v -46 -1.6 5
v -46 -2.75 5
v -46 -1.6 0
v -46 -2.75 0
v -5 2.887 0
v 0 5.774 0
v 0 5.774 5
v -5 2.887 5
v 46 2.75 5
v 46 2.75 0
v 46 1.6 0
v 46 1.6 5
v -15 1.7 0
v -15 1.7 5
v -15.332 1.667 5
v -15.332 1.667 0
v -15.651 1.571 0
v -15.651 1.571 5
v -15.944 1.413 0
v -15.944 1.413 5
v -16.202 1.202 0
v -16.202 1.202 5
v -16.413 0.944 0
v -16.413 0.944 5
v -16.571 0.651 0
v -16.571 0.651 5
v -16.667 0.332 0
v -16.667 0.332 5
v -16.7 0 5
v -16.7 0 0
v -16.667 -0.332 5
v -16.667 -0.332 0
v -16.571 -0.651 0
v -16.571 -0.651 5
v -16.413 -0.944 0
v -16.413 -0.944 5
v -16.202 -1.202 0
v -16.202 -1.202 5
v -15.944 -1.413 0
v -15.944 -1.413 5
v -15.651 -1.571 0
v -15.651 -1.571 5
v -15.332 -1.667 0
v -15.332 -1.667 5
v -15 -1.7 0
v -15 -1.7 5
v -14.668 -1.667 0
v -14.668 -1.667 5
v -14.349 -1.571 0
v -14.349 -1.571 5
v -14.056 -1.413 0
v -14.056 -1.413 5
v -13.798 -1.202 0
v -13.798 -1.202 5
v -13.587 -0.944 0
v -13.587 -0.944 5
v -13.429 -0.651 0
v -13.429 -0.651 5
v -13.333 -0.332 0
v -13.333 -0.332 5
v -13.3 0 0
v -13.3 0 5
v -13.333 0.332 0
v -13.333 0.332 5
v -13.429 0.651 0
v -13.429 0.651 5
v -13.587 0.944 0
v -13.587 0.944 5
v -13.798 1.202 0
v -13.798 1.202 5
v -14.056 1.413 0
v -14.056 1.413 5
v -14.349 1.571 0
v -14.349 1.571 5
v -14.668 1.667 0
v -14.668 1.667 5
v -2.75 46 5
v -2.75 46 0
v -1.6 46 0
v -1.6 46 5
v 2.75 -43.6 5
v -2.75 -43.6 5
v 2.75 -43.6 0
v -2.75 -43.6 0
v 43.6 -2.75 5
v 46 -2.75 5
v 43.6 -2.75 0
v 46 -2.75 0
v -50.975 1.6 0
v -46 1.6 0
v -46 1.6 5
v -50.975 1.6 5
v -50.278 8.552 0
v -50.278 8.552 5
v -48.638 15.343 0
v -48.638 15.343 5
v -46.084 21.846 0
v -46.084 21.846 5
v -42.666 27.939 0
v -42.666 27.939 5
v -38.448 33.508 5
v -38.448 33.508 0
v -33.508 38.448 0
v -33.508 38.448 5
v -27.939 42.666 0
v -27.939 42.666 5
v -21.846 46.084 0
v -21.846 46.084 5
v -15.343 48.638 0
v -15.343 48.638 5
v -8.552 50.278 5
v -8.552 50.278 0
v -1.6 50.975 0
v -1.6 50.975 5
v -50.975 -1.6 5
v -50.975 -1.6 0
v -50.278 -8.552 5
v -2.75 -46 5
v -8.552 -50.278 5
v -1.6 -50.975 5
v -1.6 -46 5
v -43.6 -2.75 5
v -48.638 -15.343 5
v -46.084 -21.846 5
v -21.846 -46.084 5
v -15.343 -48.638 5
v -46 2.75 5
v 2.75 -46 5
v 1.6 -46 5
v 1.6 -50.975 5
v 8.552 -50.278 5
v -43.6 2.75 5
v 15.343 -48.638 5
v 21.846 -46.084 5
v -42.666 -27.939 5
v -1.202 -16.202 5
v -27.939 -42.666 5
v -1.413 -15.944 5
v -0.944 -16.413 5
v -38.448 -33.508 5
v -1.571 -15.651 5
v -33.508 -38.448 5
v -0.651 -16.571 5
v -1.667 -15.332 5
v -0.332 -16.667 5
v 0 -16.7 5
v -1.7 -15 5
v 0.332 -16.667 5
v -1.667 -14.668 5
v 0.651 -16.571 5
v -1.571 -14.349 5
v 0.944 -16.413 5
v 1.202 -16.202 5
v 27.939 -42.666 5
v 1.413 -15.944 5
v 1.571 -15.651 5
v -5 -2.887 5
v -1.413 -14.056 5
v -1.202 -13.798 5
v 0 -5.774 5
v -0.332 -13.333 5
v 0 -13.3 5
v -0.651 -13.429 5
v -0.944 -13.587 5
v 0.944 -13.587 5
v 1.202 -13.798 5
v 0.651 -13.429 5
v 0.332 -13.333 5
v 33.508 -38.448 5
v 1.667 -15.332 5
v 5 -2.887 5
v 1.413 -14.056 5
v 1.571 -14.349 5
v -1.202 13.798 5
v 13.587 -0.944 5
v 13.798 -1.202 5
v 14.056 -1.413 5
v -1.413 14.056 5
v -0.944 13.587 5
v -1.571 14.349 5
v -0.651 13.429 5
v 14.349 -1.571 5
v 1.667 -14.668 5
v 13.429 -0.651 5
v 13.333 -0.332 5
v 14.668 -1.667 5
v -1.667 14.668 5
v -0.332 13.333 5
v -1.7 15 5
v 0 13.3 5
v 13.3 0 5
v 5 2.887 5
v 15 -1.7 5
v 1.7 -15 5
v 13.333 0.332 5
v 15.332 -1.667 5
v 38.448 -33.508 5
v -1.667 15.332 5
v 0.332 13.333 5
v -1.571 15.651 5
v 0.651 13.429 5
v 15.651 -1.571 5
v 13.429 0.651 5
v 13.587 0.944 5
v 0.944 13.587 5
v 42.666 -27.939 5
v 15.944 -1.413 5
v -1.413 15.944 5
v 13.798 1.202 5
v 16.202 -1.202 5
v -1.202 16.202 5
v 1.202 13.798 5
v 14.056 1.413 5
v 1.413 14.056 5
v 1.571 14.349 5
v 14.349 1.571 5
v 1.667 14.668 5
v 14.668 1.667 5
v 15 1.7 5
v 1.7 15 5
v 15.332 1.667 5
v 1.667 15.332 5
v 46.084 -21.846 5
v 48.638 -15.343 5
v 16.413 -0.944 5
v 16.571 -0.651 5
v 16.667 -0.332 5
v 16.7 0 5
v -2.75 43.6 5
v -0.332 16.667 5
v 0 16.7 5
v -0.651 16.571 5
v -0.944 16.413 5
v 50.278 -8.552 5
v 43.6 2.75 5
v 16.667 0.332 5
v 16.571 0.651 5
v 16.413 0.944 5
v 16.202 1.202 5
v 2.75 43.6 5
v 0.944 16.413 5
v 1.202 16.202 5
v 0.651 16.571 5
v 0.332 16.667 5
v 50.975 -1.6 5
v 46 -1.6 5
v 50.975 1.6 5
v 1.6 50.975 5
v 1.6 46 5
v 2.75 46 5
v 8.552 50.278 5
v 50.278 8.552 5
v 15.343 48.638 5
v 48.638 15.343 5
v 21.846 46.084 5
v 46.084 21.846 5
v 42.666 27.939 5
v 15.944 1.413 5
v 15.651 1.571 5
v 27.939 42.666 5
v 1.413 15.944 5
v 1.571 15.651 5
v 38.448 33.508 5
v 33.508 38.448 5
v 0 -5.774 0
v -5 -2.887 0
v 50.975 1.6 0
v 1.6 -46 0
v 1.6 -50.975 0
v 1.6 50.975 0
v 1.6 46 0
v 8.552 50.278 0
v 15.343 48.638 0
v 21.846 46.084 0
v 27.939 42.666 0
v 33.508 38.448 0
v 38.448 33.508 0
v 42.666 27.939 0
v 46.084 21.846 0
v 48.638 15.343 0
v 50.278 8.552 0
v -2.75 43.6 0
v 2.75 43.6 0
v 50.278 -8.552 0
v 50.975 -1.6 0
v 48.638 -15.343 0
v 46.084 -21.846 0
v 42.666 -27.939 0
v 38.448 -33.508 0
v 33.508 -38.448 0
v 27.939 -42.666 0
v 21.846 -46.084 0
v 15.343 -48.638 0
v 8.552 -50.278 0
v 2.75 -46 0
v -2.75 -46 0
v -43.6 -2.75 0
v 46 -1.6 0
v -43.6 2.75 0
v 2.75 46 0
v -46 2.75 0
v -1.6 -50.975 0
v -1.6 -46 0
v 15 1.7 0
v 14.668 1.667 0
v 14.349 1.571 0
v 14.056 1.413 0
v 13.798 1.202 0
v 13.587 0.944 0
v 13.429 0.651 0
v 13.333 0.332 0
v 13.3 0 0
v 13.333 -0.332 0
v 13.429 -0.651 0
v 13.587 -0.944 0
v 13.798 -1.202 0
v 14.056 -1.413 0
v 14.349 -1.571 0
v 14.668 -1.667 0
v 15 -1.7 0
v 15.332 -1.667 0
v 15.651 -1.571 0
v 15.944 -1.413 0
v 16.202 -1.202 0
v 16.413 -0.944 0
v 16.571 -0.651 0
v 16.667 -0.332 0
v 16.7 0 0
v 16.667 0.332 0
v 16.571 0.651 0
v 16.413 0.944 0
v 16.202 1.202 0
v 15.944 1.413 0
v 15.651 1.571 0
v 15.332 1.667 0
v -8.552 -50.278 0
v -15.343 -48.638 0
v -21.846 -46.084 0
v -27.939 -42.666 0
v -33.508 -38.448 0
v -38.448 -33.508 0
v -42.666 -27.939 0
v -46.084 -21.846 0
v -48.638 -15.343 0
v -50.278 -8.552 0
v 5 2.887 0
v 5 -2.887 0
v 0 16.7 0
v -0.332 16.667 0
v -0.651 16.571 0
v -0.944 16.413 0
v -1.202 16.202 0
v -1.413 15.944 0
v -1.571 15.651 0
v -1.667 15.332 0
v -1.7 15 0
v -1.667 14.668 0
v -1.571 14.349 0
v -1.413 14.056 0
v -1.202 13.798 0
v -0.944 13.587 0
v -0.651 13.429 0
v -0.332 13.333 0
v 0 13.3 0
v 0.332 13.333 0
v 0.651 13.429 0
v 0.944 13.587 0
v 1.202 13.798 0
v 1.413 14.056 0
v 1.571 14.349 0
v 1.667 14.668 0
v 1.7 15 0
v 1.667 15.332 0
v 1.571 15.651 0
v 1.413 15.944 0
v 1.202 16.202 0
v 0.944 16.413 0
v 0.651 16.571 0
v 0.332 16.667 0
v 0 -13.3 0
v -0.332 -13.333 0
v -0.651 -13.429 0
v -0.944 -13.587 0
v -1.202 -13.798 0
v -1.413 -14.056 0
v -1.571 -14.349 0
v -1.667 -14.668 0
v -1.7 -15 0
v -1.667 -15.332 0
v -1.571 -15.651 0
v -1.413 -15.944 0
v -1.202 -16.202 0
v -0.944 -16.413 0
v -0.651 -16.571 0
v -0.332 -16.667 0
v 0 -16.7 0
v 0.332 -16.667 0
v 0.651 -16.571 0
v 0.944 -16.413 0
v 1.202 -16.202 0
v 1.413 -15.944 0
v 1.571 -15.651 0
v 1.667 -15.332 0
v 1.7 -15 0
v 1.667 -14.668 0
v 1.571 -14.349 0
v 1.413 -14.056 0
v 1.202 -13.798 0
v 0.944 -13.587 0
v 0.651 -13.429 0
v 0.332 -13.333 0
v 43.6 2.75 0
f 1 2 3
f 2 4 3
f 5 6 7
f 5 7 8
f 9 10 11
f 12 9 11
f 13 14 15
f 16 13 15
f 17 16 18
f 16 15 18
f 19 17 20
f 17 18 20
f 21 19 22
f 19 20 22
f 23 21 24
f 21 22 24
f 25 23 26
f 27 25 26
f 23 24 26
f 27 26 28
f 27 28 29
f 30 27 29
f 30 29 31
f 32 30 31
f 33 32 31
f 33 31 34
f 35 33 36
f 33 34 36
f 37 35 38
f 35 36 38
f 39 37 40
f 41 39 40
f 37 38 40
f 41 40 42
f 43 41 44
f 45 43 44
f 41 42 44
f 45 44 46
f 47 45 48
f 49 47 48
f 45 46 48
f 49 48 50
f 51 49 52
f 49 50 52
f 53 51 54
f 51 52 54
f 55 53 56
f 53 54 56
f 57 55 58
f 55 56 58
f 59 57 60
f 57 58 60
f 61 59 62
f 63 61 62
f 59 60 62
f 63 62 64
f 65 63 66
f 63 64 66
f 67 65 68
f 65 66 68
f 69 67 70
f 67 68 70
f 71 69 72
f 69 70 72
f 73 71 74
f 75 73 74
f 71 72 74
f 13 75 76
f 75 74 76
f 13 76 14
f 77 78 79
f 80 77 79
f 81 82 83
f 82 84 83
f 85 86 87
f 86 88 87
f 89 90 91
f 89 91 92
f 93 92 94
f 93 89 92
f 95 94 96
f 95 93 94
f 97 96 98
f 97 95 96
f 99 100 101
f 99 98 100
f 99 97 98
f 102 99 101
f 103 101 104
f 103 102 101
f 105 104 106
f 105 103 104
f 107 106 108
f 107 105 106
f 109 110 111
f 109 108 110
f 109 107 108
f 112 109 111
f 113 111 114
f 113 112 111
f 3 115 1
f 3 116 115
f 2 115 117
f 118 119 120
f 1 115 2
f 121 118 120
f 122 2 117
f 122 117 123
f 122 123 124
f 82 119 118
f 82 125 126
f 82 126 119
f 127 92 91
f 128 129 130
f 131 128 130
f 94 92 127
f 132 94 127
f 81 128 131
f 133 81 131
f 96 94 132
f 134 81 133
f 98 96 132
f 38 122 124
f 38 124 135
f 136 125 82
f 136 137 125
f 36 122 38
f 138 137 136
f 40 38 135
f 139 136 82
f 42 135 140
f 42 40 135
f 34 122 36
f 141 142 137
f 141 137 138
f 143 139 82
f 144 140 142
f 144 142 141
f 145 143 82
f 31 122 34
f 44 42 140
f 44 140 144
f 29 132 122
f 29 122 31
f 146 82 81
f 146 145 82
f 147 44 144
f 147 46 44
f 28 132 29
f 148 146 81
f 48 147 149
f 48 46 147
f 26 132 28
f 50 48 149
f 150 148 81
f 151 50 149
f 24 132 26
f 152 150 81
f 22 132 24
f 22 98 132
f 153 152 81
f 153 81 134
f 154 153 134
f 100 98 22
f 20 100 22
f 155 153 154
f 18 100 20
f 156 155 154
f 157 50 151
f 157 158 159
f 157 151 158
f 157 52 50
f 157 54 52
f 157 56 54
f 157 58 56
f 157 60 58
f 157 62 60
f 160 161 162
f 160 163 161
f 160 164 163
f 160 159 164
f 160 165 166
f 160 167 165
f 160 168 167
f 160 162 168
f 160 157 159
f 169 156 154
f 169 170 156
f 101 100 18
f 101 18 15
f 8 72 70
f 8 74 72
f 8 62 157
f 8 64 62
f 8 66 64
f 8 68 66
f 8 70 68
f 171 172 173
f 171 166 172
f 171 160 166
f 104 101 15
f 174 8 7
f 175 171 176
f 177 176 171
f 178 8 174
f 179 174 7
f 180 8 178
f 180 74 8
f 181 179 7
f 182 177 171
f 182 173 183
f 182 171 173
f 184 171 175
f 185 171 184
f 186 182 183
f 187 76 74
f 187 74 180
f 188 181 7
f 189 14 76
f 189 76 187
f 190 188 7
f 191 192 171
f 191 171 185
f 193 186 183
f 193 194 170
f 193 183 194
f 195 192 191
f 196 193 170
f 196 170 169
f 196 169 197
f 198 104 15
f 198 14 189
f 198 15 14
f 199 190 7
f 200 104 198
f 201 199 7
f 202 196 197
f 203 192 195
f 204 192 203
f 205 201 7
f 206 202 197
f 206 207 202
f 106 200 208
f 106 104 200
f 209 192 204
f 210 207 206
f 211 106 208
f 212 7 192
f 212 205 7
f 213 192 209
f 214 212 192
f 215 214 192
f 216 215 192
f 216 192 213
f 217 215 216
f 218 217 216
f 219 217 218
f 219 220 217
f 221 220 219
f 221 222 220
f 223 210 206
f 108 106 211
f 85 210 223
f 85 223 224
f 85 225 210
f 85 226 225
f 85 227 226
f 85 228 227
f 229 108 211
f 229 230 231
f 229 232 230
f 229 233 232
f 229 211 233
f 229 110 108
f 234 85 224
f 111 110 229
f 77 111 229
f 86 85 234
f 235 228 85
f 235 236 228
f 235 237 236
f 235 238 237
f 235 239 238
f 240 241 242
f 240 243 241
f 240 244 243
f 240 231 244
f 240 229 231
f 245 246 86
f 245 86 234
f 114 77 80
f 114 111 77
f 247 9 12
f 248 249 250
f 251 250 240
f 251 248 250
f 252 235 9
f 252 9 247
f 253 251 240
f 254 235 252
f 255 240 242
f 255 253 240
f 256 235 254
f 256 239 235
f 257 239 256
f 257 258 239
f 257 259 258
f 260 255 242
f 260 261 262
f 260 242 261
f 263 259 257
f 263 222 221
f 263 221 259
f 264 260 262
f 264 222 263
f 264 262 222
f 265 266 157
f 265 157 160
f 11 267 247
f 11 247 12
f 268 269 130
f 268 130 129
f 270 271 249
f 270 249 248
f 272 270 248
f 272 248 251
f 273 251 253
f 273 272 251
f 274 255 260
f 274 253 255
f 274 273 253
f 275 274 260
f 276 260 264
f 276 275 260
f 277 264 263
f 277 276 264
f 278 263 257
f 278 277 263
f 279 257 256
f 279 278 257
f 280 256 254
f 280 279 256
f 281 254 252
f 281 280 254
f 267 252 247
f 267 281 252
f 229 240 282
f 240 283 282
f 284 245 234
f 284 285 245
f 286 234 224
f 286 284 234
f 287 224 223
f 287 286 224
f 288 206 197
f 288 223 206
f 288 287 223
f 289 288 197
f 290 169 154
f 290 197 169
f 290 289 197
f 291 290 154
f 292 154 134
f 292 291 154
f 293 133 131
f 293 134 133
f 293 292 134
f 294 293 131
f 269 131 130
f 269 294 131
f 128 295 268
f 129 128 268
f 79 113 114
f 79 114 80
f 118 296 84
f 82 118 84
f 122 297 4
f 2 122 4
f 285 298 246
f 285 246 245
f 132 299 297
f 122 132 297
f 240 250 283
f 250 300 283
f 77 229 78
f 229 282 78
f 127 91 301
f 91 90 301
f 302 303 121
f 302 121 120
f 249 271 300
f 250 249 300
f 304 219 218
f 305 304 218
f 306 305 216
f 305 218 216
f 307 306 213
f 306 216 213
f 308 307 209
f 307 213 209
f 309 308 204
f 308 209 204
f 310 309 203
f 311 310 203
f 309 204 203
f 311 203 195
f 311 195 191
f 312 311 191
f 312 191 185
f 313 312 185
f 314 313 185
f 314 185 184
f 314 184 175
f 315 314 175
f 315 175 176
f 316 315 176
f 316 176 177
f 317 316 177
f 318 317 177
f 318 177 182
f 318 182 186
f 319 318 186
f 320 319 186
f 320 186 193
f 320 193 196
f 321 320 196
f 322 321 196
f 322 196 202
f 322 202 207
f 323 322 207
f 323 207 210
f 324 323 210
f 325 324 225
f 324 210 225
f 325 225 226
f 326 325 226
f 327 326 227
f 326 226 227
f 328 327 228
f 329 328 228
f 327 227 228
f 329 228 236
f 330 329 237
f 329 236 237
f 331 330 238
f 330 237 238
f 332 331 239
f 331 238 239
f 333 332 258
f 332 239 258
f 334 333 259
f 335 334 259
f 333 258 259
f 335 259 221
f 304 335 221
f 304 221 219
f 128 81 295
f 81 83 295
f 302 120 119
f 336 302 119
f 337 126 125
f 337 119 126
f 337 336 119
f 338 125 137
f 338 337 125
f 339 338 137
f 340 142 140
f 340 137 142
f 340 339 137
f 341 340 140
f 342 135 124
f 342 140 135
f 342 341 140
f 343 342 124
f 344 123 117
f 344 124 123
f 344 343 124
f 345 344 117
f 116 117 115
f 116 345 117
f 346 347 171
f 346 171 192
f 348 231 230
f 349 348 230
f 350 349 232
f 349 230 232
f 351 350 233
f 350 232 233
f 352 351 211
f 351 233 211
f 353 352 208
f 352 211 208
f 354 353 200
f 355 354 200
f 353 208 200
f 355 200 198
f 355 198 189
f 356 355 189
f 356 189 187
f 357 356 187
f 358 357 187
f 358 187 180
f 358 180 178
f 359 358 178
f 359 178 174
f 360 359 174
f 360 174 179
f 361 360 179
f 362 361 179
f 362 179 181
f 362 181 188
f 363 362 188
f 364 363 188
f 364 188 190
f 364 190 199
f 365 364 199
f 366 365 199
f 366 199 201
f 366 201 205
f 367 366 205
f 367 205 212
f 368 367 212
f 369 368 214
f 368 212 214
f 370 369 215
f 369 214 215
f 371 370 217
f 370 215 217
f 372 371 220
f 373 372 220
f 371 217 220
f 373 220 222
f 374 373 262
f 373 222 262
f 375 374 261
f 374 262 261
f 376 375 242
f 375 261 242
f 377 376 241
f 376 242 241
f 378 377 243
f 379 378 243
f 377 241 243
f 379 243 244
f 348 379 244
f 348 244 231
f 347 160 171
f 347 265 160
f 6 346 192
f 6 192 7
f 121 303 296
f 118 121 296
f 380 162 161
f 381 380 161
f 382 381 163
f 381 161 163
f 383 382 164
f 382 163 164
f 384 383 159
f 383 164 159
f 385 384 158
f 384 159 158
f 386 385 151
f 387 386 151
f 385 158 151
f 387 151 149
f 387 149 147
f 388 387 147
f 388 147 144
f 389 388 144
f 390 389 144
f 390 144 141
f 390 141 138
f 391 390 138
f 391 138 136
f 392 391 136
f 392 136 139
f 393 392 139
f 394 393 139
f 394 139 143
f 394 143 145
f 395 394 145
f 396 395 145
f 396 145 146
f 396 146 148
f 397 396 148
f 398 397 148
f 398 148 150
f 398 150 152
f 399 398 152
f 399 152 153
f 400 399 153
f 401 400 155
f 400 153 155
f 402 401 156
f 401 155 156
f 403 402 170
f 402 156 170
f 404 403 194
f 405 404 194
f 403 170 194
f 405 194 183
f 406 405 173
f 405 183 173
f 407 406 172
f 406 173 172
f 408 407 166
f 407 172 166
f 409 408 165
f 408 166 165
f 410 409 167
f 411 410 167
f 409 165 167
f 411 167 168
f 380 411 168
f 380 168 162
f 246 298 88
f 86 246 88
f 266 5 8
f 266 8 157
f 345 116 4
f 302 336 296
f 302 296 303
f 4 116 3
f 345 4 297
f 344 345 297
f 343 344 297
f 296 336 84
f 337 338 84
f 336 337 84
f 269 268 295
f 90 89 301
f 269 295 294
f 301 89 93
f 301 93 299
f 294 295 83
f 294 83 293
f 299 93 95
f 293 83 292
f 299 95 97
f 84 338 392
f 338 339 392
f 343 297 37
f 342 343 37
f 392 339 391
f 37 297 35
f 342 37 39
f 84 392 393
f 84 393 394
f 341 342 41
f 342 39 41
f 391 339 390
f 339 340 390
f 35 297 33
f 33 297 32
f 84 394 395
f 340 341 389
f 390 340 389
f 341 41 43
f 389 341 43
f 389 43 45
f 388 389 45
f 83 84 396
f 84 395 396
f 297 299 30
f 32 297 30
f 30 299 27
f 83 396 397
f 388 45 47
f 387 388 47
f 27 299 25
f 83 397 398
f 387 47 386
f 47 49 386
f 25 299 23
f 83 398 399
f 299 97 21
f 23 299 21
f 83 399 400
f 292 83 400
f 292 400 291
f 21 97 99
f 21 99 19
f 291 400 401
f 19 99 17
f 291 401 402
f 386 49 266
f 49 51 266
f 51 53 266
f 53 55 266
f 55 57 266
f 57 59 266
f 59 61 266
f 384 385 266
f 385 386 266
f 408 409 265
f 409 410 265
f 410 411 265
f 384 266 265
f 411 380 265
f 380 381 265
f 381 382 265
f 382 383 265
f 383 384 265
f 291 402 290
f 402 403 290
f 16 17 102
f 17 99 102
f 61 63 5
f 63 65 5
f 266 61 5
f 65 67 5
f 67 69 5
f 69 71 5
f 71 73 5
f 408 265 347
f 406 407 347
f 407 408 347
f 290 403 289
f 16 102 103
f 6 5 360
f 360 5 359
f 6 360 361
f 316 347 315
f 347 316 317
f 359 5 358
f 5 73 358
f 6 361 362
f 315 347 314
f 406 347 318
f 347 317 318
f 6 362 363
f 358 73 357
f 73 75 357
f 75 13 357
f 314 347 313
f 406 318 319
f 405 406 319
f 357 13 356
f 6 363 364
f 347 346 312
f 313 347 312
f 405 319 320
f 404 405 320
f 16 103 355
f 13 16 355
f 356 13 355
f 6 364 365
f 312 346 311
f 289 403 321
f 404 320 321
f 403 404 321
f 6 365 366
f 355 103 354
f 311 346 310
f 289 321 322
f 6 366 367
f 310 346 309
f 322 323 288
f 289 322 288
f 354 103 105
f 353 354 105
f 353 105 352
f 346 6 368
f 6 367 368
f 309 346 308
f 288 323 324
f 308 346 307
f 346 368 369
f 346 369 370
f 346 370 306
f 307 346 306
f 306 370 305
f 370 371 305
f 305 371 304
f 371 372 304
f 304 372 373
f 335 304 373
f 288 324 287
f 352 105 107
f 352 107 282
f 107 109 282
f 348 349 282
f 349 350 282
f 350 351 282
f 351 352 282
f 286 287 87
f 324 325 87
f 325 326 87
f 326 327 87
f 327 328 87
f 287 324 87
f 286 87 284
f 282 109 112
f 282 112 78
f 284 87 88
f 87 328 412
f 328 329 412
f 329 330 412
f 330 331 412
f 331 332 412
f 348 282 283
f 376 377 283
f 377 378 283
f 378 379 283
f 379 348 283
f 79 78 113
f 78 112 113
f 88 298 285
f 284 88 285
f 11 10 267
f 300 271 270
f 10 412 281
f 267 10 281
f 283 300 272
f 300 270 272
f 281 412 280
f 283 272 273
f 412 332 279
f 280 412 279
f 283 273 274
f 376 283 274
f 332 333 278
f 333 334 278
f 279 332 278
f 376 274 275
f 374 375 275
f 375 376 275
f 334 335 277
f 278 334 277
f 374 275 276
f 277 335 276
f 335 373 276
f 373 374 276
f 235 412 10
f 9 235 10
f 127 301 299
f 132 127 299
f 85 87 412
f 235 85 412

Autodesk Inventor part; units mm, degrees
ref_plane "YZ Plane" through (0, 0, 0) normal (1, 0, 0) x (0, 1, 0)
ref_plane "XZ Plane" through (0, 0, 0) normal (0, 1, 0) x (-1, 0, 0)
ref_plane "XY Plane" through (0, 0, 0) normal (0, 0, 1) x (1, 0, 0)
sketch "Sketch1" plane through (0, 0, 0) normal (0, 0, 1) x (1, 0, 0)
  circle A0 centre (0, 0) radius 51
  dimension "d0" = 102
extrude "Extrusion1" add sketch "Sketch1" along normal blind 5
sketch "Sketch2" plane through (0, 0, 0) normal (0, 0, -1) x (-1, 0, 0)
  line L0 (0, 5.7735) -> (5, 2.8868)
  line L1 (5, 2.8868) -> (5, -2.8868)
  line L2 (5, -2.8868) -> (0, -5.7735)
  line L3 (0, -5.7735) -> (-5, -2.8868)
  line L4 (-5, -2.8868) -> (-5, 2.8868)
  line L5 (-5, 2.8868) -> (0, 5.7735)
  point P0 (0, 0)
  point P1 (0, 0)
  dimension "d3" = 10
extrude "Extrusion2" cut sketch "Sketch2" against normal blind 5
sketch "Sketch3" plane through (0, 0, 0) normal (0, 0, -1) x (-1, 0, 0)
  circle A0 centre (0, 0) radius 15 construction
  point P0 (0, 15)
  point P1 (15, 0)
  point P2 (0, -15)
  point P3 (-15, 0)
  dimension "d6" = 30
hole "Hole1" at (0, 15, 0) at (-15, 0, 0) at (0, -15, 0) at (15, 0, 0) direction (0, 0, 1) diameter 3.4 depth 8 tip angle 118 clearance for "Countersunk Flat Head Screw DIN EN ISO 2009" size "M3" standard "DIN"
sketch "Sketch4" plane through (0, 0, 0) normal (0, 0, -1) x (-1, 0, 0)
  line L0 (-1.6, 51) -> (1.6, 51)
  line L1 (1.6, 51) -> (1.6, 46)
  line L2 (1.6, 46) -> (-2.75, 46)
  line L3 (-2.75, 46) -> (-2.75, 43.6)
  line L4 (-2.75, 43.6) -> (2.75, 43.6)
  line L5 (2.75, 43.6) -> (2.75, 46)
  line L6 (2.75, 46) -> (-1.6, 46)
  line L7 (-1.6, 46) -> (-1.6, 51)
  line L8 (-51, -1.6) -> (-51, 1.6)
  line L9 (-51, 1.6) -> (-46, 1.6)
  line L10 (-46, 1.6) -> (-46, -2.75)
  line L11 (-46, -2.75) -> (-43.6, -2.75)
  line L12 (-43.6, -2.75) -> (-43.6, 2.75)
  line L13 (-43.6, 2.75) -> (-46, 2.75)
  line L14 (-46, 2.75) -> (-46, -1.6)
  line L15 (-46, -1.6) -> (-51, -1.6)
  line L16 (1.6, -51) -> (-1.6, -51)
  line L17 (-1.6, -51) -> (-1.6, -46)
  line L18 (-1.6, -46) -> (2.75, -46)
  line L19 (2.75, -46) -> (2.75, -43.6)
  line L20 (2.75, -43.6) -> (-2.75, -43.6)
  line L21 (-2.75, -43.6) -> (-2.75, -46)
  line L22 (-2.75, -46) -> (1.6, -46)
  line L23 (1.6, -46) -> (1.6, -51)
  line L24 (51, 1.6) -> (51, -1.6)
  line L25 (51, -1.6) -> (46, -1.6)
  line L26 (46, -1.6) -> (46, 2.75)
  line L27 (46, 2.75) -> (43.6, 2.75)
  line L28 (43.6, 2.75) -> (43.6, -2.75)
  line L29 (43.6, -2.75) -> (46, -2.75)
  line L30 (46, -2.75) -> (46, 1.6)
  line L31 (46, 1.6) -> (51, 1.6)
  point P0 (0, 0)
  point P1 (0, 43.6)
  point P2 (0, 51)
  point P3 (-51, 0)
  point P4 (-43.6, 0)
  point P5 (0, -51)
  point P6 (0, -43.6)
  point P7 (51, 0)
  point P8 (43.6, 0)
  dimension "d14" = 5
  dimension "d15" = 2.4
  dimension "d16" = 5.5
  dimension "d17" = 3.2
  dimension "d18" = 51
  dimension "d21" = 360
extrude "Extrusion3" cut sketch "Sketch4" against normal through all
properties part number "PlexiHalter1" material "Polycarbonate, Clear"
